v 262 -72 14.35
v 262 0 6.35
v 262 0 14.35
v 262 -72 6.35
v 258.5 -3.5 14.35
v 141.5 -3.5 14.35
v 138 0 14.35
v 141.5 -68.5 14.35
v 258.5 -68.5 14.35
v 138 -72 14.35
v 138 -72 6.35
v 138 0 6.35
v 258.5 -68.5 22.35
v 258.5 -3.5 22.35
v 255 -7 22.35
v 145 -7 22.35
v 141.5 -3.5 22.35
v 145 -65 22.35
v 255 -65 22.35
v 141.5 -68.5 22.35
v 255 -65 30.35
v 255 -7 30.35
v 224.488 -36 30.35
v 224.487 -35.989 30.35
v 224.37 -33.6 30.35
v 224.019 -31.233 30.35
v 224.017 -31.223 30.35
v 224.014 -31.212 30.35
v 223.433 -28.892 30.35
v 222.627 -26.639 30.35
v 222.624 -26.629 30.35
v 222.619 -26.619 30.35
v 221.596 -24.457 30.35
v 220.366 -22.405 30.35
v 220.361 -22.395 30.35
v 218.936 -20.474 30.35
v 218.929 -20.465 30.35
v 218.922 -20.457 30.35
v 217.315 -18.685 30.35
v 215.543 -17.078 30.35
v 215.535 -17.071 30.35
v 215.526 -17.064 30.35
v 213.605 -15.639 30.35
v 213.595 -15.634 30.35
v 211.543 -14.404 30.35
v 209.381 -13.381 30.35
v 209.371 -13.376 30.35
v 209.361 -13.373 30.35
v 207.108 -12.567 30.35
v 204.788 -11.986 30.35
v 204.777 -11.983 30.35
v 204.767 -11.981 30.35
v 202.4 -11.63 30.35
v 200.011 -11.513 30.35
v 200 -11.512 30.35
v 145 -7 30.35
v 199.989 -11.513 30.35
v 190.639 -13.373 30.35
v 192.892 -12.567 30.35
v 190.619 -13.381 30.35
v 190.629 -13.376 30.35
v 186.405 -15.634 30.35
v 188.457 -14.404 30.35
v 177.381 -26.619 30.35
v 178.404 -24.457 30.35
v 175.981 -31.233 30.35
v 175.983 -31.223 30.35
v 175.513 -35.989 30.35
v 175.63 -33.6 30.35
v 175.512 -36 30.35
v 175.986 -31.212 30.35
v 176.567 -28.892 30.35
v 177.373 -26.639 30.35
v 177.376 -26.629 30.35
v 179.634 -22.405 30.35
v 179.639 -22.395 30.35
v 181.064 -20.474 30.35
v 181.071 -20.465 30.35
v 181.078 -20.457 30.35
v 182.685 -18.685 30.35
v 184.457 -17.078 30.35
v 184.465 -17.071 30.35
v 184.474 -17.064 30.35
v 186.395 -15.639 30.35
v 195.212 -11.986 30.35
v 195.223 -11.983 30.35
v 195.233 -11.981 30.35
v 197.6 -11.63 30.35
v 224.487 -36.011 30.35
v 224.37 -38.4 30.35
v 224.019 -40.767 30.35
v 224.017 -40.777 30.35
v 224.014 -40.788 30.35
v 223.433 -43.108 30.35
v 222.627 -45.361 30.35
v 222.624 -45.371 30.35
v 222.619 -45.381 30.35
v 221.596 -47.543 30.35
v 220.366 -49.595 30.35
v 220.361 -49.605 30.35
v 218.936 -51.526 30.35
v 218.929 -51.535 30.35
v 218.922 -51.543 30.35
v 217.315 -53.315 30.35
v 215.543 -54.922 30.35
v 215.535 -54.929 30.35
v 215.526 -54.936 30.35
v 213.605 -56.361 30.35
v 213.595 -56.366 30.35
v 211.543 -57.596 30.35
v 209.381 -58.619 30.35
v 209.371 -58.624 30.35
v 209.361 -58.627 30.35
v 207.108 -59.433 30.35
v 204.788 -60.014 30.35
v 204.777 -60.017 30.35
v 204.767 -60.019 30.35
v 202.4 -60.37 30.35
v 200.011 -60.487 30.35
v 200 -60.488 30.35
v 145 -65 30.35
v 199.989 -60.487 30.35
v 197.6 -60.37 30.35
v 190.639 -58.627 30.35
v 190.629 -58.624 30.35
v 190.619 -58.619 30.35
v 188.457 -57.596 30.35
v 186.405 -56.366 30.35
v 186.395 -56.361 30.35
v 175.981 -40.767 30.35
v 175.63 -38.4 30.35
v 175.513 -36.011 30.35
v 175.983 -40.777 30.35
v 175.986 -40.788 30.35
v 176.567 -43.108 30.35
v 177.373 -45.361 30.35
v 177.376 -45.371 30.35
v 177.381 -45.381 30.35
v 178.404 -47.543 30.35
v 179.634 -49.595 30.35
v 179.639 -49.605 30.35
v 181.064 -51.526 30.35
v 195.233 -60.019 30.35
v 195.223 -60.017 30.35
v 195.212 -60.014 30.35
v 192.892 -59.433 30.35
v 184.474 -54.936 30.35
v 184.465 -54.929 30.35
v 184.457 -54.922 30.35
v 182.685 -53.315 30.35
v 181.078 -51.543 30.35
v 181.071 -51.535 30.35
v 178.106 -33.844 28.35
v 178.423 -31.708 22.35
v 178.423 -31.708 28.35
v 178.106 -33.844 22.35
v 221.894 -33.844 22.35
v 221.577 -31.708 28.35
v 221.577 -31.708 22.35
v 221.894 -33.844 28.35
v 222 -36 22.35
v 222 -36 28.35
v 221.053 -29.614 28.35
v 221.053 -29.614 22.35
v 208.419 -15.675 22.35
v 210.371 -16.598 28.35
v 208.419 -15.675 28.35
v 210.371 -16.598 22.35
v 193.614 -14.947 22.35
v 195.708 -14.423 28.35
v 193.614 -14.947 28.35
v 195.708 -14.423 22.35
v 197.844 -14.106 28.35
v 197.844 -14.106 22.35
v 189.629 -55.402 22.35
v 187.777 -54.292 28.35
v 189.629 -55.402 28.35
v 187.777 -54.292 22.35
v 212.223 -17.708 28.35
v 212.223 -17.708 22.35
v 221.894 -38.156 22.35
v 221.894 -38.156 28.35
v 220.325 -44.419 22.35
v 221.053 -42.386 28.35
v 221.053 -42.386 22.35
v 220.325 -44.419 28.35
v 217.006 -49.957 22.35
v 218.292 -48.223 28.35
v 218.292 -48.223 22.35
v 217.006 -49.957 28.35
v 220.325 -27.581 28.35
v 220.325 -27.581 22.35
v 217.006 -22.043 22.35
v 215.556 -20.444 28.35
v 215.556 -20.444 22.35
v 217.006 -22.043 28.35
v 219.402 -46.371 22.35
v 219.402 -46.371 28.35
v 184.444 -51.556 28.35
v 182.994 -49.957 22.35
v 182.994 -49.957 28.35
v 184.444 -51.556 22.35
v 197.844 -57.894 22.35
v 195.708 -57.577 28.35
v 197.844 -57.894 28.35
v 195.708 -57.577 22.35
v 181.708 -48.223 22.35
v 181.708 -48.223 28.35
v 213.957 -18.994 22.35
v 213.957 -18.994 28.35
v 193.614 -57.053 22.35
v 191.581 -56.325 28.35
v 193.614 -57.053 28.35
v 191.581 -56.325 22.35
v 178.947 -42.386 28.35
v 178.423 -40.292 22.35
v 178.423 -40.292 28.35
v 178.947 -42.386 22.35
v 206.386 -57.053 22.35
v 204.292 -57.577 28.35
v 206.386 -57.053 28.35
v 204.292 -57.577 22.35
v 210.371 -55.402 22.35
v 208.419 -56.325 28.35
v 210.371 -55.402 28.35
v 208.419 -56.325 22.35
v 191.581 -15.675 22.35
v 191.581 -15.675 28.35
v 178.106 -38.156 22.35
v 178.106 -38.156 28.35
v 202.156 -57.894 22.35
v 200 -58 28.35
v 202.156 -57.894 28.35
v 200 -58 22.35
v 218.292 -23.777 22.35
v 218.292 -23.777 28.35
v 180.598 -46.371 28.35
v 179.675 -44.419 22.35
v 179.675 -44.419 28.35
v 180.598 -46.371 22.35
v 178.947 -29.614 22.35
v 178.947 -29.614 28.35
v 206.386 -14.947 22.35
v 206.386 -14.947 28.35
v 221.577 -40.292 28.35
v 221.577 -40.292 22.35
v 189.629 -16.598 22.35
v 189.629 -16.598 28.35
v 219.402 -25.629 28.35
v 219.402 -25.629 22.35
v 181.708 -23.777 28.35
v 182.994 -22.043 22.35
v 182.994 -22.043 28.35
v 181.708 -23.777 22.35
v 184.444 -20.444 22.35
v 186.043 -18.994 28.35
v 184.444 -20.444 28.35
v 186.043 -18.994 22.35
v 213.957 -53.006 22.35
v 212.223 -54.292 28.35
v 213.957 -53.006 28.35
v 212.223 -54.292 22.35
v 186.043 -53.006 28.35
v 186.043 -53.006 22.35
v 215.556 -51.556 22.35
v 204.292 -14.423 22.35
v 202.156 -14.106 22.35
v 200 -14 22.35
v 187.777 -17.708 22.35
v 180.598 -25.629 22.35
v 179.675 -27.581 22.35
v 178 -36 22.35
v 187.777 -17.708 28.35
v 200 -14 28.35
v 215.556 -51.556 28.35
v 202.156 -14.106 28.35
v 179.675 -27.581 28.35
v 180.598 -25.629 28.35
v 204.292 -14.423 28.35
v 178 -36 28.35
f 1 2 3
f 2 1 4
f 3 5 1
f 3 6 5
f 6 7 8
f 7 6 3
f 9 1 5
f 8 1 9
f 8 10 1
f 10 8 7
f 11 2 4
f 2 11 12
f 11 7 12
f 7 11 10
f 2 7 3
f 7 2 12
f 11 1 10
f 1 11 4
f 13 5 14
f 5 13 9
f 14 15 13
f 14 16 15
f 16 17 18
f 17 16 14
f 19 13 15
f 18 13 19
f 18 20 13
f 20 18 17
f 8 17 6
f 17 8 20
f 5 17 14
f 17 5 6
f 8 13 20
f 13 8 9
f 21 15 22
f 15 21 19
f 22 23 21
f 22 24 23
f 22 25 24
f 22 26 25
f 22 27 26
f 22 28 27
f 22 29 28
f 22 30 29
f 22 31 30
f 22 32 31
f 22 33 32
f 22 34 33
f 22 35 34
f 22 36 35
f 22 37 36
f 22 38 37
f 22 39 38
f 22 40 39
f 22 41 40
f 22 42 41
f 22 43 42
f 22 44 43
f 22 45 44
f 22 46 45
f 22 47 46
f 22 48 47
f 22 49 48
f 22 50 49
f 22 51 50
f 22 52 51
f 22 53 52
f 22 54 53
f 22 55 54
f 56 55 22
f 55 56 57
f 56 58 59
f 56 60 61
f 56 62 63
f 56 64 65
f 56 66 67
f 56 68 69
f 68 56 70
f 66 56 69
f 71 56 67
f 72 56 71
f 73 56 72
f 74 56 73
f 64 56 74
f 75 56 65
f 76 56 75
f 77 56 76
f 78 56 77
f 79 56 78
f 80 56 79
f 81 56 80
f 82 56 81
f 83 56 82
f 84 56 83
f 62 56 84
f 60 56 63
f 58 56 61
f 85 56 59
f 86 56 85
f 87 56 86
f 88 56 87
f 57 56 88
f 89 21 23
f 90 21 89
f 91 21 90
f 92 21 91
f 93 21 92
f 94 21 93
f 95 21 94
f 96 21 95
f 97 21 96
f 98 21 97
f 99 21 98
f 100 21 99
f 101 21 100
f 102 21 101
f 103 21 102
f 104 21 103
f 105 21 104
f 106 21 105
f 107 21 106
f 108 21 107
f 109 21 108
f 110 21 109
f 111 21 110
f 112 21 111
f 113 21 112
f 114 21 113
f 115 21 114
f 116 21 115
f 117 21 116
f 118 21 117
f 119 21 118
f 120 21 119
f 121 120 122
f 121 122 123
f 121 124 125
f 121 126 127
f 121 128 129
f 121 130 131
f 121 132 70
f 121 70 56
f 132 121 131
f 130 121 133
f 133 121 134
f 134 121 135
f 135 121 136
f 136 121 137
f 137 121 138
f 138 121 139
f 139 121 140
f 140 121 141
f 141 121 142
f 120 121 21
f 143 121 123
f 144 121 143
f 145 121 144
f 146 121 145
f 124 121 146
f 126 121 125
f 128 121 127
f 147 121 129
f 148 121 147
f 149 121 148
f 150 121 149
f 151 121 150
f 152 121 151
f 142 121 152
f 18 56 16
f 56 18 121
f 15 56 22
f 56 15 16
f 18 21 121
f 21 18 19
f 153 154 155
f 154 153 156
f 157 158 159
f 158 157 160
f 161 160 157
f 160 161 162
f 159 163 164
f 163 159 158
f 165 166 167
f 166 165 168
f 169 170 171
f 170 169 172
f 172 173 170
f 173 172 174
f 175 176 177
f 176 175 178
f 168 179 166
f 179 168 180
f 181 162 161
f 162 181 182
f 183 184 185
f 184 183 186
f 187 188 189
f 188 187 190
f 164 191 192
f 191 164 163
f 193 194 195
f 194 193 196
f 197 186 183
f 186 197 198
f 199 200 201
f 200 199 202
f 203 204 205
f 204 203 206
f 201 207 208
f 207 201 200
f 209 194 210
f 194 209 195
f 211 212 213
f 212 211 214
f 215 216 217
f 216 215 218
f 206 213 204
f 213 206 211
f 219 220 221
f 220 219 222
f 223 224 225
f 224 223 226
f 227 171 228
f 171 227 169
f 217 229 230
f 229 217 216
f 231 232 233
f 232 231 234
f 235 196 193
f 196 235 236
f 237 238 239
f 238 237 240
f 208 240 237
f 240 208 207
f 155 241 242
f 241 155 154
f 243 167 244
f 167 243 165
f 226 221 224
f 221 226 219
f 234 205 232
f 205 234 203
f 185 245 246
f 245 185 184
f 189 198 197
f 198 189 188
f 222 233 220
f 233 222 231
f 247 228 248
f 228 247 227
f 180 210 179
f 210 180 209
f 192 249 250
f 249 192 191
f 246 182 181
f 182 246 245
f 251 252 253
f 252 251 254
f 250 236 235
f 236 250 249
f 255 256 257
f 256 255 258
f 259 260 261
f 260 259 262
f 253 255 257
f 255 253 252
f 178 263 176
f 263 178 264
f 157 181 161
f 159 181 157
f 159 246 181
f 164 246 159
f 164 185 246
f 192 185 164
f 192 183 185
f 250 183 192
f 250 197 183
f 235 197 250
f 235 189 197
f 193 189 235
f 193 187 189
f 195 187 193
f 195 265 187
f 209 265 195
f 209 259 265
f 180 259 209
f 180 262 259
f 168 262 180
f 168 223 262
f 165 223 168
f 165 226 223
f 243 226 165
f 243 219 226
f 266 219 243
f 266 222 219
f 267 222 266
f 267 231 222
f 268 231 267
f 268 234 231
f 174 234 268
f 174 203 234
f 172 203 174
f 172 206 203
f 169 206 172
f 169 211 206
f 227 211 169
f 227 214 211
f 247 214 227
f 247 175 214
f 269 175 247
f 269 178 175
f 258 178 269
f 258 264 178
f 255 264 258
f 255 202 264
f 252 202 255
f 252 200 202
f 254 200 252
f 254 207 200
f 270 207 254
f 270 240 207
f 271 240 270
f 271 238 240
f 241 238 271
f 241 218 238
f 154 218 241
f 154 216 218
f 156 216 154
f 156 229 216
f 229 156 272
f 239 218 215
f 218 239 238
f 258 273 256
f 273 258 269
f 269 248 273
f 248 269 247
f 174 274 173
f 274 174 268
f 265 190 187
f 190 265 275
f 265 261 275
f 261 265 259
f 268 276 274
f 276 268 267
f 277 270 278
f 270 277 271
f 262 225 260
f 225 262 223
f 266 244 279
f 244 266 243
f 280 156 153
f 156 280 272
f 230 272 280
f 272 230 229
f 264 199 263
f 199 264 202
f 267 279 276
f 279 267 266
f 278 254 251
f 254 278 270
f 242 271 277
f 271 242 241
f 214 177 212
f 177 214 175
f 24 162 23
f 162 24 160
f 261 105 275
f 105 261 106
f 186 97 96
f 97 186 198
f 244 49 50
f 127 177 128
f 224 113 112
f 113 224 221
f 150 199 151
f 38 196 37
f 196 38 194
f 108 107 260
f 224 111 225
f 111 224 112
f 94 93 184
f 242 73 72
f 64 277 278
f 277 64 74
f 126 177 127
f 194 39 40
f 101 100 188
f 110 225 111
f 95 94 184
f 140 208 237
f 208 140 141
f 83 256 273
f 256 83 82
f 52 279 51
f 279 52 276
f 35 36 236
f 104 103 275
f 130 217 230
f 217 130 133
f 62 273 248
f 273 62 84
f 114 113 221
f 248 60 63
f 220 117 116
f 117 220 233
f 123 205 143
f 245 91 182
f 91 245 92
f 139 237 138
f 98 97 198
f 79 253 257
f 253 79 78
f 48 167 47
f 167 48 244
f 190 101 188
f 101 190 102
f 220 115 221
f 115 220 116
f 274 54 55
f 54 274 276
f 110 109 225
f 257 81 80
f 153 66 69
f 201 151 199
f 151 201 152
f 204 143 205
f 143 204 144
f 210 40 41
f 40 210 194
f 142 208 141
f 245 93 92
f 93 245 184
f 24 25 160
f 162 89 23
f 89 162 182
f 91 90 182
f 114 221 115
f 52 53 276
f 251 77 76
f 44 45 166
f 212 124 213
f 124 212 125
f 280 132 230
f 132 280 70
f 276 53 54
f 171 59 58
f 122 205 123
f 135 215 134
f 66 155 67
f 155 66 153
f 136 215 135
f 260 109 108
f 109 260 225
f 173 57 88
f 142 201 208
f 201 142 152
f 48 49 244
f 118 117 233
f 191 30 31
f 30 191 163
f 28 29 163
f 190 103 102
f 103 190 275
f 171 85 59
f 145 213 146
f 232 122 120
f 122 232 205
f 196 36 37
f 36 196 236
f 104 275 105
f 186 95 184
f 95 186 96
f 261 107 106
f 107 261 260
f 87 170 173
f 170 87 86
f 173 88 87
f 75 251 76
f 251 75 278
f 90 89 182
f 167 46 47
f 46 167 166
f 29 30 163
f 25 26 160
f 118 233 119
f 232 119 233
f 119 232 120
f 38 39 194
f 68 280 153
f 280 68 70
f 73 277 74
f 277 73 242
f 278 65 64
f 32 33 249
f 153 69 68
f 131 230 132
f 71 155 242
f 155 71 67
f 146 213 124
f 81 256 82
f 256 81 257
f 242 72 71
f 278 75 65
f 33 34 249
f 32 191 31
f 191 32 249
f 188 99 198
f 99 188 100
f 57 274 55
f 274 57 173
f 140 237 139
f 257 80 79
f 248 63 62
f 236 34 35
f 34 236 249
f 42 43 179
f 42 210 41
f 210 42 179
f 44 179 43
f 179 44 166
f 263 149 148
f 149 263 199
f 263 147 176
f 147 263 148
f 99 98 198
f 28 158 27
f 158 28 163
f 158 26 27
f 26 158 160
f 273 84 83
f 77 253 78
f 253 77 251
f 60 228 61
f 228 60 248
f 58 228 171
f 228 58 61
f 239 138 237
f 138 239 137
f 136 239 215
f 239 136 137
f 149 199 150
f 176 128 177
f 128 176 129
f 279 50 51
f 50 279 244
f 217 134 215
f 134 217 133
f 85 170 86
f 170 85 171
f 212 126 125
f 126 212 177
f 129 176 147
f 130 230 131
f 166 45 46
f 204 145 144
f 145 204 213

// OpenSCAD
// file: turned_kalasa_module.scad
// ---------- Turned Kalasa Finial Module ----------

module turned_kalasa(h = 60,fn=180) {
    scale_factor = h / 45;
    scale([scale_factor, scale_factor, scale_factor])
    rotate_extrude($fn = fn) {
        cove_pts  = [ for (a = [0 : 6 : 90]) [ 7.5 + 5.5 * cos(a), 2.0 + 3.0 * sin(a) ] ];
        belly_pts = [ for (a = [0 : 3 : 180]) [ 7.5 + 7.0 * sin(a), 5.0 + 17.0 * (a / 180) ] ];
        neck_pts  = [ for (a = [0 : 6 : 90]) [ 6.0 + 1.5 * cos(a), 22.0 + 2.0 * sin(a) ] ];
        ring_pts  = [ for (a = [0 : 6 : 180]) [ 6.0 + 4.5 * sin(a) - 1.5 * (a / 180), 24.0 + 7.0 * (a / 180) ] ];
        spire_pts = [ for (i = [0 : 15]) let(t = i / 15) [ 1.5 + 3.0 * pow(1 - t, 1.3), 31.0 + 12.5 * t ] ];
        tip_pts   = [ for (a = [0 : 10 : 90]) [ 1.5 * cos(a), 43.5 + 1.5 * sin(a) ] ];

        profile = concat(
            [[0, 0], [13.0, 0], [13.0, 2.0]],
            cove_pts,
            belly_pts,
            neck_pts,
            ring_pts,
            spire_pts,
            tip_pts,
            [[0, 45]]
        );
        
        polygon(profile);
    }
}
// file: printed_diya_shelf_module.scad
include<turned_kalasa_module.scad>

module printed_diya_shelf() {
    w  = diya_proj_w;
    d  = diya_proj_depth;
    x0 = (base_w - w) / 2;
    
    tray_h = 24.0; 
    tx = x0 + 8; 
    ty = -d + 8;
    tw = w - 16;
    td = d - 8;
    
    // True center of the tray platform
    center_x = tx + tw / 2;
    center_y = ty + td / 2;
    
    num_steps  = 3;           
    step_h      = tray_h / num_steps; 
    step_inset  = 3.5;        

    eps = 0.01;
    $fn = 64;

    color([0.95, 0.82, 0.45]) { 
        difference() {
            // 1. Stepped Pyramid Base
            union() {
                for (i = [0 : num_steps - 1]) {
                    inset = i * step_inset;
                    translate([tx + inset, ty + inset, deck_top + (i * step_h)])
                        cube([tw - (2 * inset), td - (2 * inset), step_h]);
                }
            }

            // 2. Central Diya Seating Recess (Centered on Platform)
            translate([center_x, center_y, deck_top + tray_h - 8])
                cylinder(h = 8 + eps, r = diya_seat_r);

            // Chamfered Entry Ring
            translate([center_x, center_y, deck_top + tray_h - 2])
                cylinder(h = 2 + eps, r1 = diya_seat_r, r2 = diya_seat_r + 2.5);
        }

        // 3. Mini Corner Finials on Top Tier
        top_inset = (num_steps - 1) * step_inset;
        top_w = tw - (2 * top_inset);
        top_d = td - (2 * top_inset);
        top_tx = tx + top_inset;
        top_ty = ty + top_inset;

        corner_pts = [
            [top_tx + 4, top_ty + 4],
            [top_tx + top_w - 4, top_ty + 4],
            [top_tx + 4, top_ty + top_d - 4],
            [top_tx + top_w - 4, top_ty + top_d - 4]
        ];

        /*for (pt = corner_pts) {
            translate([pt[0], pt[1], deck_top + tray_h]) {
                turned_kalasa(14);
            }
        }*/
    }
}
// file: parameters.scad
$fn = 128; // Resolution for rounded extrusions
eps = 0.05;

// ---------- Hardware & Material Parameters (Fixed Physical Hardware) ----------
wood_t        = 6.35;    // 1/4 inch wood plate thickness
cardboard_t   = 3.00;    // Standard single-wall corrugated cardboard thickness
pvc_od        = 21.34;   // 1/2" Schedule 40 PVC Pipe outer diameter
sleeve_id     = 22.20;   // Inner bore for 3D printed sleeves
r_inner       = sleeve_id / 2; // 11.1mm inner radius bore

// ---------- Sleeve Shell Thickness ----------
sleeve_wall_t = 1.2;    // Uniform hollow shell wall thickness (mm) to minimize weight

// ---------- Flange Clearance Parameters ----------
flange_bottom_h = 5.0;  // Clearance reserved at bottom for wide flat flange region (mm)
flange_top_h    = 5.0;  // Clearance reserved at top for upper mounting flange (mm)

// ---------- Main Structure Dimensions ----------
base_w = 400;             
base_d = 280;            

wall_h = 400;            
beam_h = 60;              
arch_r = 50.67;           

roof_overhang = 20;       

diya_proj_depth = 80;     
diya_proj_w     = 140;    
diya_seat_r     = 22;  

// ---------- Derived Coordinates & Heights ----------
deck_top   = wood_t;
pillar_top = deck_top + wall_h;
roof_bot   = pillar_top;
roof_top   = roof_bot + wood_t;

// Sleeve Height adjusted to clear top and bottom flanges
sleeve_h   = wall_h - flange_bottom_h - flange_top_h;

// Pillar Rod Center Offsets from Origin
pillar_x1 = 37.33;        
pillar_x2 = base_w - 37.33;
pillar_y1 = 37.33;        
pillar_y2 = base_d - 37.33;


//Shikara
tier_h = 20;
            num_tiers = 5;
tier_dims = [
                [208.00, 208.00], 
                [165.00, 165.00], 
                [122.00, 122.00], 
                [82.00,  82.00],  
                [48.00,  48.00]   
            ];
// main file
include<parameters.scad>
//include<printed_shikhara_module.scad>
//printed_shikhara(10,20,40);

// main 4 kalasha
//include<turned_kalasa_module.scad>
//turned_kalasa(65);

// Top 1 kalasha
//include<turned_kalasa_module.scad>
//turned_kalasa(65);

// Top 1 kalasha
//include<turned_kalasa_module.scad>
//turned_kalasa(28);

//include<turned_pillar_profile_module.scad>
//turned_half_pillar_profile(r_inner,sleeve_wall_t,sleeve_h);

//include<corner_base_module.scad>
//corner_base(0,0);

//include<printed_shikhara_module.scad>
//printed_shikhara(base_w,base_d,roof_top);

include<printed_diya_shelf_module.scad>;
printed_diya_shelf(); 
